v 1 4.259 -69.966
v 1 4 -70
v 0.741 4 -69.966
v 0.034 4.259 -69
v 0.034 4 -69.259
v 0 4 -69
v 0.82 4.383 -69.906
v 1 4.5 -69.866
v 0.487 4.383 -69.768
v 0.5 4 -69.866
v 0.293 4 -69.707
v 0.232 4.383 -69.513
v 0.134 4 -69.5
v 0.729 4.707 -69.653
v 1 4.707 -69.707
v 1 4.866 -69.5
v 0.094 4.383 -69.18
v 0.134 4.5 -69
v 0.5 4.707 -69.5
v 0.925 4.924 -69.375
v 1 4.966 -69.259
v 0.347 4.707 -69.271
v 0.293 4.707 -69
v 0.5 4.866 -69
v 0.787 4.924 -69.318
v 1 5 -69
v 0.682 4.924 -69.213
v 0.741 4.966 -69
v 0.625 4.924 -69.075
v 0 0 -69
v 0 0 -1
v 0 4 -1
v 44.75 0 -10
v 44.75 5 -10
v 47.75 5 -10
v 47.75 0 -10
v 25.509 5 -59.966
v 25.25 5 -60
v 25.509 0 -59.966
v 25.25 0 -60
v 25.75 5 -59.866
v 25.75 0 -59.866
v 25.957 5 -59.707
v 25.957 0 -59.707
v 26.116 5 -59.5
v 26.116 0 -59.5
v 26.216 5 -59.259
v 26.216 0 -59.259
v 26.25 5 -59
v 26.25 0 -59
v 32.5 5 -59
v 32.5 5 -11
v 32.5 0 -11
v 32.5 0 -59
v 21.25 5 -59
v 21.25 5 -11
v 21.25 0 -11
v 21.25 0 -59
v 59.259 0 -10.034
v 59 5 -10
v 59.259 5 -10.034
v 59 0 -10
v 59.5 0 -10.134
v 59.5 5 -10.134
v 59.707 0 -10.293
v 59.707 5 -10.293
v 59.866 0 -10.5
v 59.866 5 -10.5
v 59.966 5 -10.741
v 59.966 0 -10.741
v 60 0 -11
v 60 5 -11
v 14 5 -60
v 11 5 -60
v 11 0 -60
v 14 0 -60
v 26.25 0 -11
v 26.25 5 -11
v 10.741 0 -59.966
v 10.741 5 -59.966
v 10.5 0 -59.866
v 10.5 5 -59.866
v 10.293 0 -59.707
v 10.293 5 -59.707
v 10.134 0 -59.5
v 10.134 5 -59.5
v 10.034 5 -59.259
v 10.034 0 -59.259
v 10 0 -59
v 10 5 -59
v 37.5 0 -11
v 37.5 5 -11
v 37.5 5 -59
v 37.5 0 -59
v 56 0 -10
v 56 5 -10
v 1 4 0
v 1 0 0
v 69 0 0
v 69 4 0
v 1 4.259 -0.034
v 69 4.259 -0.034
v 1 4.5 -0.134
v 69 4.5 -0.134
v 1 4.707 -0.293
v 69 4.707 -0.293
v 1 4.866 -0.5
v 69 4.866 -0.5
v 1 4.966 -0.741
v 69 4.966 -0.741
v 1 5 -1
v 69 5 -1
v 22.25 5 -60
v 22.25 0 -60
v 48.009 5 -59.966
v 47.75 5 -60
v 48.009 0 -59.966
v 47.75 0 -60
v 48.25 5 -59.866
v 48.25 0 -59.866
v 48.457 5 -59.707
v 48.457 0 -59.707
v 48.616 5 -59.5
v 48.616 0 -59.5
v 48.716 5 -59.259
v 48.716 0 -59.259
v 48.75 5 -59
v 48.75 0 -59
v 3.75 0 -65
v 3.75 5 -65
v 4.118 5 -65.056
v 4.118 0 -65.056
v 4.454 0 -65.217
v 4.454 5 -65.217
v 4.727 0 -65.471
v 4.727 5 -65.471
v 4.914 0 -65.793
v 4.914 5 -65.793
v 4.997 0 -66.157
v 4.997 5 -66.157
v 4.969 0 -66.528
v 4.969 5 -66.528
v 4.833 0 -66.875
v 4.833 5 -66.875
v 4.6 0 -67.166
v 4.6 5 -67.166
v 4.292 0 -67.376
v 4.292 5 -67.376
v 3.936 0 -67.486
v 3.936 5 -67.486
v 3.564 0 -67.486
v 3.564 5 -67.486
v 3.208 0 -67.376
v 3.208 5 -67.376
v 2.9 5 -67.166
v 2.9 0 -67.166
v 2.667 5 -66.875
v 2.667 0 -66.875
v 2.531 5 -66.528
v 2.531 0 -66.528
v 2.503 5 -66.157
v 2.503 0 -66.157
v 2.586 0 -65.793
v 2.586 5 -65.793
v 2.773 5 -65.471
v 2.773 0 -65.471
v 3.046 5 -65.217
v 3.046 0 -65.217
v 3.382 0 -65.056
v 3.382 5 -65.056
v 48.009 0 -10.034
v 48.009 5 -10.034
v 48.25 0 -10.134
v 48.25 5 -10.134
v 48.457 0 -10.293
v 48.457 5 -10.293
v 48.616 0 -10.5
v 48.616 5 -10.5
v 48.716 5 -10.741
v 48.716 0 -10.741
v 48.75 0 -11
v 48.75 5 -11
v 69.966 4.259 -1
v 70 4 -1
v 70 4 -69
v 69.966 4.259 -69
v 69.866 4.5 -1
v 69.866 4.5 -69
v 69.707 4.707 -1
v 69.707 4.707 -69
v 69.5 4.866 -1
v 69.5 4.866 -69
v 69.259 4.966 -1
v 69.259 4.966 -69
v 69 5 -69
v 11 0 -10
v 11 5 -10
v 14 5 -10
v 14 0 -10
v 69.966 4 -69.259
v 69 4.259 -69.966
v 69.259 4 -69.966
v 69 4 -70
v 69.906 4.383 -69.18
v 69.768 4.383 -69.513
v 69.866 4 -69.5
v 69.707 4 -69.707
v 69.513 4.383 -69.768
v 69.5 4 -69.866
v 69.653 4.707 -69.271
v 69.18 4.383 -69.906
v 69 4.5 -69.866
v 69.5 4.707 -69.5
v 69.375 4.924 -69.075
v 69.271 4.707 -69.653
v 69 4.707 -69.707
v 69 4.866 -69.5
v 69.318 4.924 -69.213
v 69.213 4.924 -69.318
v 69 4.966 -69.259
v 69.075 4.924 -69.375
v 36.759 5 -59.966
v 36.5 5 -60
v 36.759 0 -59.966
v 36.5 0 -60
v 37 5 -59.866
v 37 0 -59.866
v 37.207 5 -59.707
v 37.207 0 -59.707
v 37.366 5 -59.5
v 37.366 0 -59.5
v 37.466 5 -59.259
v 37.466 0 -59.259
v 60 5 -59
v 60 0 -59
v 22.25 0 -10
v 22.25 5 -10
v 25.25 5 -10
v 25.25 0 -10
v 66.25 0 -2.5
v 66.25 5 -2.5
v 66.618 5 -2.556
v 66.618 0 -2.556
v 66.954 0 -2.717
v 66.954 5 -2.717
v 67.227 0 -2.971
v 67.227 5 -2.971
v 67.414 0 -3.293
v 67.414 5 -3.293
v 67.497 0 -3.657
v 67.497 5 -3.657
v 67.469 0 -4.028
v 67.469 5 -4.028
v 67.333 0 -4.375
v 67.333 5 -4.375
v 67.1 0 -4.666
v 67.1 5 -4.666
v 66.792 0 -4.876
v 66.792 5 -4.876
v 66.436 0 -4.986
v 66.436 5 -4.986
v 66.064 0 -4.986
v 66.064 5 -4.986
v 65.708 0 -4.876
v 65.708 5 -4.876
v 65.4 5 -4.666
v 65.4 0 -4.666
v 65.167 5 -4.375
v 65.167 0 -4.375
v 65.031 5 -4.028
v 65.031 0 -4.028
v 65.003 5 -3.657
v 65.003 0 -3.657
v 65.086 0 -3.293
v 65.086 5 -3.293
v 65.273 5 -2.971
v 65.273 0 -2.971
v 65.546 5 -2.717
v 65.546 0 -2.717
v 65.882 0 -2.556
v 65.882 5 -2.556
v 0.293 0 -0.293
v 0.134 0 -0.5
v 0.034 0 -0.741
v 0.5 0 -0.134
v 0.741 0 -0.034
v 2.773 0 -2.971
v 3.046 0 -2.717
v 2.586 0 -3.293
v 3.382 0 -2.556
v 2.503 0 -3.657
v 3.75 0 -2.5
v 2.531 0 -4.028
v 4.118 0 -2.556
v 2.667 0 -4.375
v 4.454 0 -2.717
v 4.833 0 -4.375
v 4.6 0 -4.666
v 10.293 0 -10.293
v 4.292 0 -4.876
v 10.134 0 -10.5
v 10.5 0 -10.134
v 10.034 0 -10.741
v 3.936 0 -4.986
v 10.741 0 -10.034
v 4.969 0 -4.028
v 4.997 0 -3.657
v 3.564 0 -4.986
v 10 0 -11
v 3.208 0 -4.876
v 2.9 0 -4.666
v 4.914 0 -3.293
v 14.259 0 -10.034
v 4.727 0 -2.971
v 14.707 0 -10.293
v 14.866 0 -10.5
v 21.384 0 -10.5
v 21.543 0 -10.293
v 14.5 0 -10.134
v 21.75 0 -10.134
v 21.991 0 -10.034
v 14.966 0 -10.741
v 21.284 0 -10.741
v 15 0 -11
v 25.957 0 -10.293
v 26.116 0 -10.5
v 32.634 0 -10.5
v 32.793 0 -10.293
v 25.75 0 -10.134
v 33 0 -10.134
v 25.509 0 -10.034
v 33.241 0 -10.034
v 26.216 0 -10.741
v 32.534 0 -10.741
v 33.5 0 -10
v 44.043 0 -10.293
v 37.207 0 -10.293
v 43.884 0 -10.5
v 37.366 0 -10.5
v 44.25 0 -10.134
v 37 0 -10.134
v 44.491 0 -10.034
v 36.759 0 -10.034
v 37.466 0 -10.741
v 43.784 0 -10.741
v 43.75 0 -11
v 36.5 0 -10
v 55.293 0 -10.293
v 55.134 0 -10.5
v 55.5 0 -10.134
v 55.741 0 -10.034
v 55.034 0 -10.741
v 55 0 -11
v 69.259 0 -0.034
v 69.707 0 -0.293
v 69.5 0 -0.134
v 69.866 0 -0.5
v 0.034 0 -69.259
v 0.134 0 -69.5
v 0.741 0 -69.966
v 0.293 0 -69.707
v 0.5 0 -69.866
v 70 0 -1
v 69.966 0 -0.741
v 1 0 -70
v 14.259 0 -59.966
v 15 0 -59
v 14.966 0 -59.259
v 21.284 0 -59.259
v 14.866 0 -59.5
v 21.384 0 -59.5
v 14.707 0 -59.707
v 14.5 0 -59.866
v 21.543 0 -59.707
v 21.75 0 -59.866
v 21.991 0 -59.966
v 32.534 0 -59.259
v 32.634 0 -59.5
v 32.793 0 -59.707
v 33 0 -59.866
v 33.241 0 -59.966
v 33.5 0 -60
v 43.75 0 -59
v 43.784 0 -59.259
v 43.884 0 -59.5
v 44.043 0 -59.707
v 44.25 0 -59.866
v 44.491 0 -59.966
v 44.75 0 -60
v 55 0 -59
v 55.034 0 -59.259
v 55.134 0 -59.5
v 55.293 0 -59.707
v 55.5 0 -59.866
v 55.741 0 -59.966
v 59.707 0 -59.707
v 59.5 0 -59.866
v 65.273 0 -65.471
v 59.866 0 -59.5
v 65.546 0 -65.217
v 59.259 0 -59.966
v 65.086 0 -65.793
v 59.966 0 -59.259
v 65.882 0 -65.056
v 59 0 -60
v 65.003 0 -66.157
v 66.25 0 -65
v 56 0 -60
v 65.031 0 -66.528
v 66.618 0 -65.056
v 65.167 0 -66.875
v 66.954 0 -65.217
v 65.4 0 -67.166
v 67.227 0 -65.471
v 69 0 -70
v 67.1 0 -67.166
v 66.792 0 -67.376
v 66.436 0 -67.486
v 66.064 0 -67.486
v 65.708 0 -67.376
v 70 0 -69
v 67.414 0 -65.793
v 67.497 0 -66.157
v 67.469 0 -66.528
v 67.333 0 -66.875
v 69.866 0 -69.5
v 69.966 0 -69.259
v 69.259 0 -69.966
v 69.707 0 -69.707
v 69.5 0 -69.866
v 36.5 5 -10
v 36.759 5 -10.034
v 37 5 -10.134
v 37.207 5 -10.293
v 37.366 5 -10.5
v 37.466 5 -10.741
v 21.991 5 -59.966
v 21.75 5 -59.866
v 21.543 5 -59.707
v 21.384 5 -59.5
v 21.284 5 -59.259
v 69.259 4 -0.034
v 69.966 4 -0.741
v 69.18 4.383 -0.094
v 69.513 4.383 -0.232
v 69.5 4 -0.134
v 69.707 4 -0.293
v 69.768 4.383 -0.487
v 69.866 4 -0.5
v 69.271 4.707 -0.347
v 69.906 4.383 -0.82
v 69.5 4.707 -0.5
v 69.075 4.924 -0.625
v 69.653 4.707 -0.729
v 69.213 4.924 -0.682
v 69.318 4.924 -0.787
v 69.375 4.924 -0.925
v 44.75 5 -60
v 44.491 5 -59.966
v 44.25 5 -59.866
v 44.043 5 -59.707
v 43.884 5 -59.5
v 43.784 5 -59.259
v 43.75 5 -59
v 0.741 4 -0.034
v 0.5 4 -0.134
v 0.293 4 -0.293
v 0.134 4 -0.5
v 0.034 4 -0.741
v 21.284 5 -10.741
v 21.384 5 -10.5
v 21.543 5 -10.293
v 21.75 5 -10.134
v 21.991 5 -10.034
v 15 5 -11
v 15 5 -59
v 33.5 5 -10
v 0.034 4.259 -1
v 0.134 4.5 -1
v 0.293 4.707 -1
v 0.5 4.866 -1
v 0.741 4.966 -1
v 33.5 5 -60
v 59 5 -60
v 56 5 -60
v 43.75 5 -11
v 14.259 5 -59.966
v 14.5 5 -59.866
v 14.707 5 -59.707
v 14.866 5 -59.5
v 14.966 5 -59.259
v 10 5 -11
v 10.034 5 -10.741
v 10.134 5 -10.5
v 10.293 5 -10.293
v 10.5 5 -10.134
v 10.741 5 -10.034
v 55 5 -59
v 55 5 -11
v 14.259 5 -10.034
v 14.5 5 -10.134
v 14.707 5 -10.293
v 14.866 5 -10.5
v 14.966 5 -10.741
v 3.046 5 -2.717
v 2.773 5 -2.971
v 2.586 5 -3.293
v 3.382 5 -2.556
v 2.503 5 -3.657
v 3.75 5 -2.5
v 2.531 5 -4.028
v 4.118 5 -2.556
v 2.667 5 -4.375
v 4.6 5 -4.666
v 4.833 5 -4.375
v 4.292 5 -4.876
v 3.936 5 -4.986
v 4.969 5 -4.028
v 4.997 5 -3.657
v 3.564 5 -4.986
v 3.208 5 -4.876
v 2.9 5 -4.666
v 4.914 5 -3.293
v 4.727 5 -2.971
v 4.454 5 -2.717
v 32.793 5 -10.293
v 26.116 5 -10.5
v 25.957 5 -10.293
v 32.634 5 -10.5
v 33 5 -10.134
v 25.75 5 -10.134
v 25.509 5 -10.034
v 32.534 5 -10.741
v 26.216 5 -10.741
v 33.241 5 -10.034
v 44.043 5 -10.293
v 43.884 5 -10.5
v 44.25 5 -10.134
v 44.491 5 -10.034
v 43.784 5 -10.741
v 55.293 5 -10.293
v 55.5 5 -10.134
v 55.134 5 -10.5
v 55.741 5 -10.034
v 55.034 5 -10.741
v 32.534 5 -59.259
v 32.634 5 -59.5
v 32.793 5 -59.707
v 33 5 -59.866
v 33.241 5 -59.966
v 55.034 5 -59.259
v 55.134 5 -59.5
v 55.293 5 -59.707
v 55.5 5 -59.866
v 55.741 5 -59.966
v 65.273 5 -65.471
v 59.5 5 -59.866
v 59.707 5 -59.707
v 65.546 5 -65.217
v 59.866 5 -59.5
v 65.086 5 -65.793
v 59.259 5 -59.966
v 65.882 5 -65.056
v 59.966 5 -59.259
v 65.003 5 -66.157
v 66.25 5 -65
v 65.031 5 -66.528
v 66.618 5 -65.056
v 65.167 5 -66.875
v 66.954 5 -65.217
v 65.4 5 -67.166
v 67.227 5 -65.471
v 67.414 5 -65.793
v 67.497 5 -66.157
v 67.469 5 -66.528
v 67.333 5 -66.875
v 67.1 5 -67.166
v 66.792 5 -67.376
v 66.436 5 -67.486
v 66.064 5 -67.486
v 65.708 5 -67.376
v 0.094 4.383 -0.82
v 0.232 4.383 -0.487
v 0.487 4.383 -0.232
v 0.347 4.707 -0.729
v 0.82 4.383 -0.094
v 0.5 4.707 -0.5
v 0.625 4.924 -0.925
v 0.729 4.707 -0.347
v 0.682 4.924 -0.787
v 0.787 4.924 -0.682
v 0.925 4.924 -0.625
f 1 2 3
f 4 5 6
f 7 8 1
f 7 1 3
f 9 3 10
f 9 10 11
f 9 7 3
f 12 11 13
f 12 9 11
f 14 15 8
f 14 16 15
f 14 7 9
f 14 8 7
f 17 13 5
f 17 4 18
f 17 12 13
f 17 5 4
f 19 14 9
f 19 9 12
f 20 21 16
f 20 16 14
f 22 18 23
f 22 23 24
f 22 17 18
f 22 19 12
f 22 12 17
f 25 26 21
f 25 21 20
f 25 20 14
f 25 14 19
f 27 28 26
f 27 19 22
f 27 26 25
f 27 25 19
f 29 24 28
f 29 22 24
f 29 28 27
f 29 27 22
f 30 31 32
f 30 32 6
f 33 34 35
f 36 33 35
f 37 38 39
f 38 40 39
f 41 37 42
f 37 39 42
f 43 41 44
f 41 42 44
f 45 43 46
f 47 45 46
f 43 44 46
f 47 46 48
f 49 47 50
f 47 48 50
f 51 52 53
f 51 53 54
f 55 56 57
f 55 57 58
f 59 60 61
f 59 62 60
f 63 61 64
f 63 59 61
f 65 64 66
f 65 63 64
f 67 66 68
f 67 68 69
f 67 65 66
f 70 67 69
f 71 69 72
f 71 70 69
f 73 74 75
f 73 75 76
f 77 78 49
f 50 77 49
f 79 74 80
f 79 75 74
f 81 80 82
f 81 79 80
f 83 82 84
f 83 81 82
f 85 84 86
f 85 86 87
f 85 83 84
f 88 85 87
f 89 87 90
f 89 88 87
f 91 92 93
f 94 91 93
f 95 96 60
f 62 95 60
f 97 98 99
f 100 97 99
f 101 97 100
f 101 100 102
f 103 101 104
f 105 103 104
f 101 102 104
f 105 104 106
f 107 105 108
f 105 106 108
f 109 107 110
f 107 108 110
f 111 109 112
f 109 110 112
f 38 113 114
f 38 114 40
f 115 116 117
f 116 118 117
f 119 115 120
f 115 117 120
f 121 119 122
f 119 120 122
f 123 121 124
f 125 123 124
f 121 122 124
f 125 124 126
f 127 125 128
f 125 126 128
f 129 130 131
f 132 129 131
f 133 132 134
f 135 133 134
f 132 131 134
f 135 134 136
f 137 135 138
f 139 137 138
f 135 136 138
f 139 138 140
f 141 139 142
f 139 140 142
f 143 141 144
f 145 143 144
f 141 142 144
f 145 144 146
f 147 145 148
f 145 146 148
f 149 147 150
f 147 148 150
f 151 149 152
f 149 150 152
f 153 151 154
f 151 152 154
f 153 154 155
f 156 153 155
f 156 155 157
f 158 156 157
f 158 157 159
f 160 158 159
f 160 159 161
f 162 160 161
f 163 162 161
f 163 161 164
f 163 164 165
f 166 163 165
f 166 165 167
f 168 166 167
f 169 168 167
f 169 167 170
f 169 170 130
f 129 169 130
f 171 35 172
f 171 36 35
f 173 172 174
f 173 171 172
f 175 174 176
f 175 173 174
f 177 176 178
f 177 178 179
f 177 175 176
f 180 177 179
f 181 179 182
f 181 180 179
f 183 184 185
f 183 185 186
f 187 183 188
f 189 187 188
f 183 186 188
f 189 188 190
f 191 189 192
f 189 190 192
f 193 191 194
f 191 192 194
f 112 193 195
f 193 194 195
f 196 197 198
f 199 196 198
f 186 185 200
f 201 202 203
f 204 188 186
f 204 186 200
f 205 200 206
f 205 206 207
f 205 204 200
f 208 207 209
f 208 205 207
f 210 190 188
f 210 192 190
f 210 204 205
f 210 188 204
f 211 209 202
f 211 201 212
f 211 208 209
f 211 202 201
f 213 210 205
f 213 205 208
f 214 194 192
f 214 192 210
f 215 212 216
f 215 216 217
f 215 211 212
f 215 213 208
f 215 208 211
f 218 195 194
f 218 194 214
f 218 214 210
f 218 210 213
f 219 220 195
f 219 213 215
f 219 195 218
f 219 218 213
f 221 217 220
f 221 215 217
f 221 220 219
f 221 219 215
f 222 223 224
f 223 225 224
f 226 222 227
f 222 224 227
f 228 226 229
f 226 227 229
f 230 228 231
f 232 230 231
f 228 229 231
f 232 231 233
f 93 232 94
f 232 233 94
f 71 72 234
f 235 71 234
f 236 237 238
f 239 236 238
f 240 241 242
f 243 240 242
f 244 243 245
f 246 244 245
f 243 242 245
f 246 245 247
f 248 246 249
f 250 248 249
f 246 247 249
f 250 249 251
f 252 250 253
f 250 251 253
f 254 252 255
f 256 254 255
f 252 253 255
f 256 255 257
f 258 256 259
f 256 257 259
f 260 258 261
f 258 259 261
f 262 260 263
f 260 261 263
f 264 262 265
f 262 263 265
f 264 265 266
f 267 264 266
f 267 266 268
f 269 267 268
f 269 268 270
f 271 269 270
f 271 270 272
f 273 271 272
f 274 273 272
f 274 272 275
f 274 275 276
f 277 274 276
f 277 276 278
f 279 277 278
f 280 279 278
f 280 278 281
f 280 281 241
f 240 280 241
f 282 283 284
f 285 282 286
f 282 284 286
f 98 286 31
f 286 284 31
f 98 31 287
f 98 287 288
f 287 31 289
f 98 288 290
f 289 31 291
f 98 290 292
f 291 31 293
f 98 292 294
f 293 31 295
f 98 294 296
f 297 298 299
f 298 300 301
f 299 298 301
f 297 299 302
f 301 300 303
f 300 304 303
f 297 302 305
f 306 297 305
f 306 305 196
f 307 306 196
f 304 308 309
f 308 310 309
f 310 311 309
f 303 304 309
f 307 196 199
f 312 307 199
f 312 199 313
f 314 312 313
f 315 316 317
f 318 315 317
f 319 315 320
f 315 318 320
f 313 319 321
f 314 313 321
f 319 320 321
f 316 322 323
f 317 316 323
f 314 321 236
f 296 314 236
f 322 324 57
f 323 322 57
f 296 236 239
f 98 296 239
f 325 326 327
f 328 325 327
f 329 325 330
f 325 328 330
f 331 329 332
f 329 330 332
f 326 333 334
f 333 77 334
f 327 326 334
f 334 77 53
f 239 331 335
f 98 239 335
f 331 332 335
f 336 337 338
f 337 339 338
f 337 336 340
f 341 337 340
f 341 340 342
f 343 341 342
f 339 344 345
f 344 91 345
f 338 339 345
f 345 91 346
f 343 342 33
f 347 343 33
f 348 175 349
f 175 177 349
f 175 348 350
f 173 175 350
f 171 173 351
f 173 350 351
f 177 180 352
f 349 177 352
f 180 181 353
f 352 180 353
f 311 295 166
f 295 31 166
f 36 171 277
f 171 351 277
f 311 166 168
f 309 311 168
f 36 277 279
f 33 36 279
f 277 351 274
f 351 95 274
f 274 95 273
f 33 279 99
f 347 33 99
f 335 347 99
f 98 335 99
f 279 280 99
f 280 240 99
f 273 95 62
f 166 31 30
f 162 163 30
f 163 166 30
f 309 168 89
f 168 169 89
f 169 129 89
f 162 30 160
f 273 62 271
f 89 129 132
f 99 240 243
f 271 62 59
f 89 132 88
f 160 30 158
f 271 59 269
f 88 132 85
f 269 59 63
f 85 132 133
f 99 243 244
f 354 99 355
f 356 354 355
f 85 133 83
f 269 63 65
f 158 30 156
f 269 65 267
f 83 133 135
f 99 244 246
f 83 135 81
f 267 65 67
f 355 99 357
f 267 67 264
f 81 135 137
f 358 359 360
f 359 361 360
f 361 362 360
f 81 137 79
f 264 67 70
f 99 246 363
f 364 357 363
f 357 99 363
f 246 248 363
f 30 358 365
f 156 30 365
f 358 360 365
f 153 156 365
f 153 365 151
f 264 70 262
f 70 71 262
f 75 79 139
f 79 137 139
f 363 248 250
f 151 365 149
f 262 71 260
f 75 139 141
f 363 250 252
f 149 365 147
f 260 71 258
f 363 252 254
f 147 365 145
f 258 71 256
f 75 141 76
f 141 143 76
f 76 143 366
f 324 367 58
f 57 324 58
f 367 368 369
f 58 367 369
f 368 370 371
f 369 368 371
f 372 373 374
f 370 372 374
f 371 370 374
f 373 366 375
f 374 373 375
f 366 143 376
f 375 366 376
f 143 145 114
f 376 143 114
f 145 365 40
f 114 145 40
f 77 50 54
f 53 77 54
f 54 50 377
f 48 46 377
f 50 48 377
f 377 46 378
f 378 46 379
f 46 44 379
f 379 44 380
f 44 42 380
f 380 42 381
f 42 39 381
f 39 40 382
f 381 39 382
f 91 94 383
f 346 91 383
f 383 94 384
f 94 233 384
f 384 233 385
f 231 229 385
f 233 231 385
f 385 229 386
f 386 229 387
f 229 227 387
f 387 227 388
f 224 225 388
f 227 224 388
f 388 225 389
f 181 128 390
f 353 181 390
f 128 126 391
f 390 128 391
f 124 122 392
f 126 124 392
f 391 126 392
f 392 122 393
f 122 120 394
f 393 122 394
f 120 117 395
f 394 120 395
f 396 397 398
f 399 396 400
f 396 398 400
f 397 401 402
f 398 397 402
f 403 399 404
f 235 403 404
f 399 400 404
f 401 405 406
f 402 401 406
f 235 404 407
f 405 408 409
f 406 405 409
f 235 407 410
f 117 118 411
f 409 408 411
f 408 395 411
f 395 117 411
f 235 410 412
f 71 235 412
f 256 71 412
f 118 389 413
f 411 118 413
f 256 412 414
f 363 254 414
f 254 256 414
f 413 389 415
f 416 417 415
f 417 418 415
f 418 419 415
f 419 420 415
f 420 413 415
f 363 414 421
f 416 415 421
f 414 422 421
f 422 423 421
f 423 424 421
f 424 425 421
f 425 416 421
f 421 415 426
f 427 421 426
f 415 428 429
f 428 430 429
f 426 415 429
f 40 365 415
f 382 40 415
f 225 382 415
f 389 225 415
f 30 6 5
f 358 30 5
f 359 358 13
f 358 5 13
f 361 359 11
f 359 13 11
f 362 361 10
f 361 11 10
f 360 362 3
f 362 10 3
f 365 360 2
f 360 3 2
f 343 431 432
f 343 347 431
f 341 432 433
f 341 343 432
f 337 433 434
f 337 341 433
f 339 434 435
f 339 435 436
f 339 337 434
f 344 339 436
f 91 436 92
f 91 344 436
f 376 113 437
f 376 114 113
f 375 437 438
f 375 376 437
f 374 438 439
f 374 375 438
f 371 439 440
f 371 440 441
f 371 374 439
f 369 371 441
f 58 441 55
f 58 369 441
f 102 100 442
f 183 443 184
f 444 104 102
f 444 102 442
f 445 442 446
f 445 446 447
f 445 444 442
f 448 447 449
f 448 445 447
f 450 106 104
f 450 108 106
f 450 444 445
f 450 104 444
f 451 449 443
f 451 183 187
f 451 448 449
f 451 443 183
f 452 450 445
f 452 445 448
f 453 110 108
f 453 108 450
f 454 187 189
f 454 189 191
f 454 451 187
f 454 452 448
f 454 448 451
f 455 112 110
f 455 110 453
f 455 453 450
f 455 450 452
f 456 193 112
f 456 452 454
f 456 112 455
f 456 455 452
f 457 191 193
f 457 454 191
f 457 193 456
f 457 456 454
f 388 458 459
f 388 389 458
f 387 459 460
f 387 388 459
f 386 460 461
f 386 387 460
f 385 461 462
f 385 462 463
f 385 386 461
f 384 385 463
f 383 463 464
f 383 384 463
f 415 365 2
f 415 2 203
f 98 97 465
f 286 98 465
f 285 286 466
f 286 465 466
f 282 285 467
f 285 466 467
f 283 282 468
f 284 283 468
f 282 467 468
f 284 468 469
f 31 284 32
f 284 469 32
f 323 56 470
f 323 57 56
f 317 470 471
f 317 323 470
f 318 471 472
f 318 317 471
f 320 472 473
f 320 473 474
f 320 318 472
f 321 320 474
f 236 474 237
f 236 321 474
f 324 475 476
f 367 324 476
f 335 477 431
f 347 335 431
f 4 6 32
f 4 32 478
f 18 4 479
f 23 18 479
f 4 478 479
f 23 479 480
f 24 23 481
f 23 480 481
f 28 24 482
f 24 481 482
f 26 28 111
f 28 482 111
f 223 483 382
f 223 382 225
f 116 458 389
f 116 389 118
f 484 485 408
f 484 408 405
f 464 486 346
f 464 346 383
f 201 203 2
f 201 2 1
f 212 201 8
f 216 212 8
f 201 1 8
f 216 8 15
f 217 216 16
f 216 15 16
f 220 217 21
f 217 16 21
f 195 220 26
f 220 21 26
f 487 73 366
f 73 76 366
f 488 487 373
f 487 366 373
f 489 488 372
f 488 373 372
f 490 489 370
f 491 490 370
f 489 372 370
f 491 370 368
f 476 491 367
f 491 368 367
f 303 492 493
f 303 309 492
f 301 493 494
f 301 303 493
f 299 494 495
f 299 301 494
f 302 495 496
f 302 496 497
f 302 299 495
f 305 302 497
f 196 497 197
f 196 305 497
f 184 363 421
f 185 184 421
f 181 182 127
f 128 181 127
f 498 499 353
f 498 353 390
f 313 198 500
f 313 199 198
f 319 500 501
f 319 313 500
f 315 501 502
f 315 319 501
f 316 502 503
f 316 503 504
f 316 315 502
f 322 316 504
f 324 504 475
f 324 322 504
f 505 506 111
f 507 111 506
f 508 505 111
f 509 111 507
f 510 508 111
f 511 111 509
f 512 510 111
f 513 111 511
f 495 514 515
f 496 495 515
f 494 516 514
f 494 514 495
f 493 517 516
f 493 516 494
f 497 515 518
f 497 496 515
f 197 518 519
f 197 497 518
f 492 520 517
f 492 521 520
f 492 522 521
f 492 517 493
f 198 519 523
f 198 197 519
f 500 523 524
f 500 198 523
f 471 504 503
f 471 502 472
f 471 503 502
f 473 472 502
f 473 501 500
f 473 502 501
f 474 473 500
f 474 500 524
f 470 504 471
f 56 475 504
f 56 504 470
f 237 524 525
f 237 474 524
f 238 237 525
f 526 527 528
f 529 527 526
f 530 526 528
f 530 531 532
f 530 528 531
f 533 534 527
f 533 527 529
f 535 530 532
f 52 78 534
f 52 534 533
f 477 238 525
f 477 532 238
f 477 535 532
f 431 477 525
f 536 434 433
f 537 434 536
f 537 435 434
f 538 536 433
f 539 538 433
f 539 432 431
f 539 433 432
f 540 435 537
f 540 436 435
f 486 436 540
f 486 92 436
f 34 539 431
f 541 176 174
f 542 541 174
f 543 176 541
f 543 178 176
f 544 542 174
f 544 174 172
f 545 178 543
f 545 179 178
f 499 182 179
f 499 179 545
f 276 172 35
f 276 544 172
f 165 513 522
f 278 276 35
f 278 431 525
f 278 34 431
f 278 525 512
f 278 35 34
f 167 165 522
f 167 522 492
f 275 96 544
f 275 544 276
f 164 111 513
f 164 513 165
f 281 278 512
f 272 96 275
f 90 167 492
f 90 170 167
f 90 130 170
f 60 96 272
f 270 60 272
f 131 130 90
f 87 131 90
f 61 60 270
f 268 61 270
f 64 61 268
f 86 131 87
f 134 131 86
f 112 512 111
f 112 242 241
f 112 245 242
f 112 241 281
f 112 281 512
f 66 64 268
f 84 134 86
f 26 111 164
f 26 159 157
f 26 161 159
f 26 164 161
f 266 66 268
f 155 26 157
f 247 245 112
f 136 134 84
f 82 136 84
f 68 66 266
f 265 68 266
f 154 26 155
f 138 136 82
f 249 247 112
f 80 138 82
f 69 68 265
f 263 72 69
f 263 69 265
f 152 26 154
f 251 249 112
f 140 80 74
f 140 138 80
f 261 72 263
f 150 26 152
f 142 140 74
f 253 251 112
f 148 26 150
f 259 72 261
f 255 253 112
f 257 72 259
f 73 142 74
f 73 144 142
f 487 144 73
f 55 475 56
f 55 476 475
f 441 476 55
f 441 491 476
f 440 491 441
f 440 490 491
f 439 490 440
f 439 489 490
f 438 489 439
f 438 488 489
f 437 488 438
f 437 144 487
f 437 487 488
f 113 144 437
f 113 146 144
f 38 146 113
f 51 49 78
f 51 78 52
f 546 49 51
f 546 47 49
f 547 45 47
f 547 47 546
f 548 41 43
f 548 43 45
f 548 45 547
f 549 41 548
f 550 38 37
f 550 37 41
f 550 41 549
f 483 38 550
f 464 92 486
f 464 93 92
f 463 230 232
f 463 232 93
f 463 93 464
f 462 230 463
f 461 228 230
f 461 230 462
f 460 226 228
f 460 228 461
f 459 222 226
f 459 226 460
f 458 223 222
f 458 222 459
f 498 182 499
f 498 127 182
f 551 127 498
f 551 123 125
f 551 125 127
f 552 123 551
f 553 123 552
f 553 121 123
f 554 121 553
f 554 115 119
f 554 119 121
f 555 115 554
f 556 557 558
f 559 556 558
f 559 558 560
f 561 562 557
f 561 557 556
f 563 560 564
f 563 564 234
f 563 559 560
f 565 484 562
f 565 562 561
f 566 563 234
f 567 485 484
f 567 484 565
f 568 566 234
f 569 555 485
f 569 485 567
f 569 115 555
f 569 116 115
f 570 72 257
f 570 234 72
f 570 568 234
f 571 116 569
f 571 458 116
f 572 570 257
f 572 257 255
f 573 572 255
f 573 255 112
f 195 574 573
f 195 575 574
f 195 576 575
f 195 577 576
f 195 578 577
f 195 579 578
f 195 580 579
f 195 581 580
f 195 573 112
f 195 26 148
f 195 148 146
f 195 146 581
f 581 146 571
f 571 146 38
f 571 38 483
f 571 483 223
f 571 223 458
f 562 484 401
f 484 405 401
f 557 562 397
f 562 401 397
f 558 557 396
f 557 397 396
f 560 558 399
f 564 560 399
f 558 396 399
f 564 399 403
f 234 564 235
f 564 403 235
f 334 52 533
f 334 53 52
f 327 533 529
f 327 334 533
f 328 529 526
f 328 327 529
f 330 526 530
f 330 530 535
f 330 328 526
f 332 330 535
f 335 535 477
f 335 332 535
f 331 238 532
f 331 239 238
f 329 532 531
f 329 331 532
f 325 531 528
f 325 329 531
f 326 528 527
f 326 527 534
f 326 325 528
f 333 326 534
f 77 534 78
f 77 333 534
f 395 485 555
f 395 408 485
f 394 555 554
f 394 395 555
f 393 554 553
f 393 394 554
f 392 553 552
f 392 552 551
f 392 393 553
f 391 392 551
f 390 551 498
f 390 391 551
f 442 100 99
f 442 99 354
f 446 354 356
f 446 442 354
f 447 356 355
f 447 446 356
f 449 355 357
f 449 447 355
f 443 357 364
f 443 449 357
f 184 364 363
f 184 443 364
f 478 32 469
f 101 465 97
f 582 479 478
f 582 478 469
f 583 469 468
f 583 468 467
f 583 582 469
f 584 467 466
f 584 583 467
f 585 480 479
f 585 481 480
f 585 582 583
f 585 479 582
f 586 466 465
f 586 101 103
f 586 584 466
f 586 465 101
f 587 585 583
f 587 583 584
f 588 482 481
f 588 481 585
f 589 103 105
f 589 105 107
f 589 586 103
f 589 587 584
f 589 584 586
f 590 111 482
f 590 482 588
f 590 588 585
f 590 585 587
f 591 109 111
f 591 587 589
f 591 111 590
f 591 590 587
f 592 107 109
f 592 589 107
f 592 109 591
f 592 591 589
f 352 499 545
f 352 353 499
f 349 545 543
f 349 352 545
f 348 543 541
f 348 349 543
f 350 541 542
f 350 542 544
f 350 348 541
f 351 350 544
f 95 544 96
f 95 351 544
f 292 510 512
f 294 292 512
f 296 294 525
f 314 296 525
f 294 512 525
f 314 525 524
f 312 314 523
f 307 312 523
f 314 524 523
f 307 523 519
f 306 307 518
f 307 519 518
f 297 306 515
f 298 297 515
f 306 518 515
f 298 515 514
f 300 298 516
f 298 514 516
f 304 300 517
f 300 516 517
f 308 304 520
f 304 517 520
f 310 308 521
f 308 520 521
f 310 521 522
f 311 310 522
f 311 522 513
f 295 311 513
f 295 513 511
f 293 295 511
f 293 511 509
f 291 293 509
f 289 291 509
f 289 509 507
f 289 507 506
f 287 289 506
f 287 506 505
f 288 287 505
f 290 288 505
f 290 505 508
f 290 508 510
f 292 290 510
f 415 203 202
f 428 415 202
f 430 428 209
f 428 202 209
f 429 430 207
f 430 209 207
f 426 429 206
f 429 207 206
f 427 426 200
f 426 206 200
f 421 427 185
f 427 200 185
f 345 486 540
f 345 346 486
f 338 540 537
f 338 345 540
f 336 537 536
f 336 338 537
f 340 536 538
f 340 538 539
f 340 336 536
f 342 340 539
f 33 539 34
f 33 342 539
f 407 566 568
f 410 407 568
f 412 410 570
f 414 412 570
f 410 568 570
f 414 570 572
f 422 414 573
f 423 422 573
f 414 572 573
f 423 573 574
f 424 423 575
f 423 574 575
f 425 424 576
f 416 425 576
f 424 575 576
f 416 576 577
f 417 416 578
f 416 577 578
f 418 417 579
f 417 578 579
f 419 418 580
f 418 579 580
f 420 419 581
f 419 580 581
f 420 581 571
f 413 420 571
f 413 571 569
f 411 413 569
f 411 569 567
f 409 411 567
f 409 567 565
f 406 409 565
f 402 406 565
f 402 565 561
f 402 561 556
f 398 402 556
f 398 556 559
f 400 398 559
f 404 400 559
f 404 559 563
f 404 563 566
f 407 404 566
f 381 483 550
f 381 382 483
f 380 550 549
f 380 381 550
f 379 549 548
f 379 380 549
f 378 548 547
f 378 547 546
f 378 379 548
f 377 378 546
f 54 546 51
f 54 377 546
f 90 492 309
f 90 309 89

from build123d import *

# Parameters (mm, degrees)
SKETCH1_W                 = 70
SKETCH1_H                 = 70
BOSS_EXTRUDE1_DEPTH       = 5
SKETCH2_R                 = 1.25
CUT_EXTRUDE1_DEPTH        = 100.121138008
LPATTERN1_COUNT           = 2
LPATTERN1_PITCH           = 62.5
LPATTERN2_COUNT           = 2
LPATTERN2_PITCH           = 62.5
LPATTERN2_COPY_1_SKETCH_R = 1.25
LPATTERN2_COPY_1_DEPTH    = 100.121138008
SKETCH3_W                 = 5
SKETCH3_H                 = 50
CUT_EXTRUDE2_DEPTH        = 100.121138008
FILLET2_R                 = 1
FILLET3_R                 = 1
FILLET4_R                 = 1
FILLET5_R                 = 1
LPATTERN3_COUNT           = 5
LPATTERN3_PITCH           = 11.25
FILLET2_OF_LPATTERN3_R    = 1
FILLET3_OF_LPATTERN3_R    = 1
FILLET4_OF_LPATTERN3_R    = 1
FILLET5_OF_LPATTERN3_R    = 1
FILLET6_R                 = 1
FILLET7_R                 = 1
FILLET8_R                 = 1
FILLET9_R                 = 1
FILLET10_R                = 1


with BuildPart() as part:
    # Sketch1 → Boss-Extrude1 (new body)
    with BuildSketch(Plane(origin=(0, 0, 0), x_dir=(1, 0, 0), z_dir=(0, 1, 0))):
        with Locations((35, 35)):
            Rectangle(SKETCH1_W, SKETCH1_H)
    extrude(amount=BOSS_EXTRUDE1_DEPTH)

    # Sketch2 → Cut-Extrude1 (cut, through all)
    with BuildSketch(Plane(origin=(0, 5, 0), x_dir=(1, 0, 0), z_dir=(0, 1, 0))):
        with Locations(Location((3.75, 3.75, 0), (0, 0, 270))):
            Circle(SKETCH2_R)
    cut_extrude1 = extrude(amount=-CUT_EXTRUDE1_DEPTH, mode=Mode.SUBTRACT)

    # LPattern1: Cut-Extrude1 ×2
    with Locations(*[(i * LPATTERN1_PITCH, 0, 0) for i in range(1, LPATTERN1_COUNT)]):
        add(cut_extrude1, mode=Mode.SUBTRACT)

    # LPattern2: Cut-Extrude1 ×2
    with Locations(*[(0, 0, -i * LPATTERN2_PITCH) for i in range(1, LPATTERN2_COUNT)]):
        add(cut_extrude1, mode=Mode.SUBTRACT)

    # LPattern2 copy 1 sketch → LPattern2 copy 1 (cut, through all)
    with BuildSketch(Plane(origin=(62.5, 5, -62.5), x_dir=(1, 0, 0), z_dir=(0, 1, 0))):
        with Locations(Location((3.75, 3.75, 0), (0, 0, 270))):
            Circle(LPATTERN2_COPY_1_SKETCH_R)
    extrude(amount=-LPATTERN2_COPY_1_DEPTH, mode=Mode.SUBTRACT)

    # Sketch3 → Cut-Extrude2 (cut, through all)
    with BuildSketch(Plane(origin=(0, 5, 0), x_dir=(1, 0, 0), z_dir=(0, 1, 0))):
        with Locations((12.5, 35)):
            Rectangle(SKETCH3_W, SKETCH3_H)
    cut_extrude2 = extrude(amount=-CUT_EXTRUDE2_DEPTH, mode=Mode.SUBTRACT)

    # Fillet2
    fillet2_edges = [part.edges().sort_by_distance(p)[0] for p in [
        (10, 2.5, -60),
    ]]
    fillet(fillet2_edges, radius=FILLET2_R)

    # Fillet3
    fillet3_edges = [part.edges().sort_by_distance(p)[0] for p in [
        (15, 2.5, -60),
    ]]
    fillet(fillet3_edges, radius=FILLET3_R)

    # Fillet4
    fillet4_edges = [part.edges().sort_by_distance(p)[0] for p in [
        (10, 2.5, -10),
    ]]
    fillet(fillet4_edges, radius=FILLET4_R)

    # Fillet5
    fillet5_edges = [part.edges().sort_by_distance(p)[0] for p in [
        (15, 2.5, -10),
    ]]
    fillet(fillet5_edges, radius=FILLET5_R)

    # LPattern3: Cut-Extrude2 ×5
    with Locations(*[(i * LPATTERN3_PITCH, 0, 0) for i in range(1, LPATTERN3_COUNT)]):
        add(cut_extrude2, mode=Mode.SUBTRACT)

    # Fillet2 of LPattern3
    fillet2_of_lpattern3_edges = [part.edges().sort_by_distance(p)[0] for p in [
        (21.25, 2.5, -60),
        (32.5, 2.5, -60),
        (43.75, 2.5, -60),
        (55, 2.5, -60),
    ]]
    fillet(fillet2_of_lpattern3_edges, radius=FILLET2_OF_LPATTERN3_R)

    # Fillet3 of LPattern3
    fillet3_of_lpattern3_edges = [part.edges().sort_by_distance(p)[0] for p in [
        (26.25, 2.5, -60),
        (37.5, 2.5, -60),
        (48.75, 2.5, -60),
        (60, 2.5, -60),
    ]]
    fillet(fillet3_of_lpattern3_edges, radius=FILLET3_OF_LPATTERN3_R)

    # Fillet4 of LPattern3
    fillet4_of_lpattern3_edges = [part.edges().sort_by_distance(p)[0] for p in [
        (21.25, 2.5, -10),
        (32.5, 2.5, -10),
        (43.75, 2.5, -10),
        (55, 2.5, -10),
    ]]
    fillet(fillet4_of_lpattern3_edges, radius=FILLET4_OF_LPATTERN3_R)

    # Fillet5 of LPattern3
    fillet5_of_lpattern3_edges = [part.edges().sort_by_distance(p)[0] for p in [
        (26.25, 2.5, -10),
        (37.5, 2.5, -10),
        (48.75, 2.5, -10),
        (60, 2.5, -10),
    ]]
    fillet(fillet5_of_lpattern3_edges, radius=FILLET5_OF_LPATTERN3_R)

    # Fillet6
    fillet6_edges = [part.edges().sort_by_distance(p)[0] for p in [
        (70, 2.5, 0),
    ]]
    fillet(fillet6_edges, radius=FILLET6_R)

    # Fillet7
    fillet7_edges = [part.edges().sort_by_distance(p)[0] for p in [
        (0, 2.5, 0),
    ]]
    fillet(fillet7_edges, radius=FILLET7_R)

    # Fillet8
    fillet8_edges = [part.edges().sort_by_distance(p)[0] for p in [
        (0, 2.5, -70),
    ]]
    fillet(fillet8_edges, radius=FILLET8_R)

    # Fillet9
    fillet9_edges = [part.edges().sort_by_distance(p)[0] for p in [
        (70, 2.5, -70),
    ]]
    fillet(fillet9_edges, radius=FILLET9_R)

    # Fillet10
    fillet10_edges = [part.edges().sort_by_distance(p)[0] for p in [
        (70, 5, -35),
        (69.707106781, 5, -0.292893219),
        (35, 5, 0),
        (0.292893219, 5, -0.292893219),
        (0, 5, -35),
        (0.292893219, 5, -69.707106781),
        (35, 5, -70),
        (69.707106781, 5, -69.707106781),
    ]]
    fillet(fillet10_edges, radius=FILLET10_R)


solid = part.part
